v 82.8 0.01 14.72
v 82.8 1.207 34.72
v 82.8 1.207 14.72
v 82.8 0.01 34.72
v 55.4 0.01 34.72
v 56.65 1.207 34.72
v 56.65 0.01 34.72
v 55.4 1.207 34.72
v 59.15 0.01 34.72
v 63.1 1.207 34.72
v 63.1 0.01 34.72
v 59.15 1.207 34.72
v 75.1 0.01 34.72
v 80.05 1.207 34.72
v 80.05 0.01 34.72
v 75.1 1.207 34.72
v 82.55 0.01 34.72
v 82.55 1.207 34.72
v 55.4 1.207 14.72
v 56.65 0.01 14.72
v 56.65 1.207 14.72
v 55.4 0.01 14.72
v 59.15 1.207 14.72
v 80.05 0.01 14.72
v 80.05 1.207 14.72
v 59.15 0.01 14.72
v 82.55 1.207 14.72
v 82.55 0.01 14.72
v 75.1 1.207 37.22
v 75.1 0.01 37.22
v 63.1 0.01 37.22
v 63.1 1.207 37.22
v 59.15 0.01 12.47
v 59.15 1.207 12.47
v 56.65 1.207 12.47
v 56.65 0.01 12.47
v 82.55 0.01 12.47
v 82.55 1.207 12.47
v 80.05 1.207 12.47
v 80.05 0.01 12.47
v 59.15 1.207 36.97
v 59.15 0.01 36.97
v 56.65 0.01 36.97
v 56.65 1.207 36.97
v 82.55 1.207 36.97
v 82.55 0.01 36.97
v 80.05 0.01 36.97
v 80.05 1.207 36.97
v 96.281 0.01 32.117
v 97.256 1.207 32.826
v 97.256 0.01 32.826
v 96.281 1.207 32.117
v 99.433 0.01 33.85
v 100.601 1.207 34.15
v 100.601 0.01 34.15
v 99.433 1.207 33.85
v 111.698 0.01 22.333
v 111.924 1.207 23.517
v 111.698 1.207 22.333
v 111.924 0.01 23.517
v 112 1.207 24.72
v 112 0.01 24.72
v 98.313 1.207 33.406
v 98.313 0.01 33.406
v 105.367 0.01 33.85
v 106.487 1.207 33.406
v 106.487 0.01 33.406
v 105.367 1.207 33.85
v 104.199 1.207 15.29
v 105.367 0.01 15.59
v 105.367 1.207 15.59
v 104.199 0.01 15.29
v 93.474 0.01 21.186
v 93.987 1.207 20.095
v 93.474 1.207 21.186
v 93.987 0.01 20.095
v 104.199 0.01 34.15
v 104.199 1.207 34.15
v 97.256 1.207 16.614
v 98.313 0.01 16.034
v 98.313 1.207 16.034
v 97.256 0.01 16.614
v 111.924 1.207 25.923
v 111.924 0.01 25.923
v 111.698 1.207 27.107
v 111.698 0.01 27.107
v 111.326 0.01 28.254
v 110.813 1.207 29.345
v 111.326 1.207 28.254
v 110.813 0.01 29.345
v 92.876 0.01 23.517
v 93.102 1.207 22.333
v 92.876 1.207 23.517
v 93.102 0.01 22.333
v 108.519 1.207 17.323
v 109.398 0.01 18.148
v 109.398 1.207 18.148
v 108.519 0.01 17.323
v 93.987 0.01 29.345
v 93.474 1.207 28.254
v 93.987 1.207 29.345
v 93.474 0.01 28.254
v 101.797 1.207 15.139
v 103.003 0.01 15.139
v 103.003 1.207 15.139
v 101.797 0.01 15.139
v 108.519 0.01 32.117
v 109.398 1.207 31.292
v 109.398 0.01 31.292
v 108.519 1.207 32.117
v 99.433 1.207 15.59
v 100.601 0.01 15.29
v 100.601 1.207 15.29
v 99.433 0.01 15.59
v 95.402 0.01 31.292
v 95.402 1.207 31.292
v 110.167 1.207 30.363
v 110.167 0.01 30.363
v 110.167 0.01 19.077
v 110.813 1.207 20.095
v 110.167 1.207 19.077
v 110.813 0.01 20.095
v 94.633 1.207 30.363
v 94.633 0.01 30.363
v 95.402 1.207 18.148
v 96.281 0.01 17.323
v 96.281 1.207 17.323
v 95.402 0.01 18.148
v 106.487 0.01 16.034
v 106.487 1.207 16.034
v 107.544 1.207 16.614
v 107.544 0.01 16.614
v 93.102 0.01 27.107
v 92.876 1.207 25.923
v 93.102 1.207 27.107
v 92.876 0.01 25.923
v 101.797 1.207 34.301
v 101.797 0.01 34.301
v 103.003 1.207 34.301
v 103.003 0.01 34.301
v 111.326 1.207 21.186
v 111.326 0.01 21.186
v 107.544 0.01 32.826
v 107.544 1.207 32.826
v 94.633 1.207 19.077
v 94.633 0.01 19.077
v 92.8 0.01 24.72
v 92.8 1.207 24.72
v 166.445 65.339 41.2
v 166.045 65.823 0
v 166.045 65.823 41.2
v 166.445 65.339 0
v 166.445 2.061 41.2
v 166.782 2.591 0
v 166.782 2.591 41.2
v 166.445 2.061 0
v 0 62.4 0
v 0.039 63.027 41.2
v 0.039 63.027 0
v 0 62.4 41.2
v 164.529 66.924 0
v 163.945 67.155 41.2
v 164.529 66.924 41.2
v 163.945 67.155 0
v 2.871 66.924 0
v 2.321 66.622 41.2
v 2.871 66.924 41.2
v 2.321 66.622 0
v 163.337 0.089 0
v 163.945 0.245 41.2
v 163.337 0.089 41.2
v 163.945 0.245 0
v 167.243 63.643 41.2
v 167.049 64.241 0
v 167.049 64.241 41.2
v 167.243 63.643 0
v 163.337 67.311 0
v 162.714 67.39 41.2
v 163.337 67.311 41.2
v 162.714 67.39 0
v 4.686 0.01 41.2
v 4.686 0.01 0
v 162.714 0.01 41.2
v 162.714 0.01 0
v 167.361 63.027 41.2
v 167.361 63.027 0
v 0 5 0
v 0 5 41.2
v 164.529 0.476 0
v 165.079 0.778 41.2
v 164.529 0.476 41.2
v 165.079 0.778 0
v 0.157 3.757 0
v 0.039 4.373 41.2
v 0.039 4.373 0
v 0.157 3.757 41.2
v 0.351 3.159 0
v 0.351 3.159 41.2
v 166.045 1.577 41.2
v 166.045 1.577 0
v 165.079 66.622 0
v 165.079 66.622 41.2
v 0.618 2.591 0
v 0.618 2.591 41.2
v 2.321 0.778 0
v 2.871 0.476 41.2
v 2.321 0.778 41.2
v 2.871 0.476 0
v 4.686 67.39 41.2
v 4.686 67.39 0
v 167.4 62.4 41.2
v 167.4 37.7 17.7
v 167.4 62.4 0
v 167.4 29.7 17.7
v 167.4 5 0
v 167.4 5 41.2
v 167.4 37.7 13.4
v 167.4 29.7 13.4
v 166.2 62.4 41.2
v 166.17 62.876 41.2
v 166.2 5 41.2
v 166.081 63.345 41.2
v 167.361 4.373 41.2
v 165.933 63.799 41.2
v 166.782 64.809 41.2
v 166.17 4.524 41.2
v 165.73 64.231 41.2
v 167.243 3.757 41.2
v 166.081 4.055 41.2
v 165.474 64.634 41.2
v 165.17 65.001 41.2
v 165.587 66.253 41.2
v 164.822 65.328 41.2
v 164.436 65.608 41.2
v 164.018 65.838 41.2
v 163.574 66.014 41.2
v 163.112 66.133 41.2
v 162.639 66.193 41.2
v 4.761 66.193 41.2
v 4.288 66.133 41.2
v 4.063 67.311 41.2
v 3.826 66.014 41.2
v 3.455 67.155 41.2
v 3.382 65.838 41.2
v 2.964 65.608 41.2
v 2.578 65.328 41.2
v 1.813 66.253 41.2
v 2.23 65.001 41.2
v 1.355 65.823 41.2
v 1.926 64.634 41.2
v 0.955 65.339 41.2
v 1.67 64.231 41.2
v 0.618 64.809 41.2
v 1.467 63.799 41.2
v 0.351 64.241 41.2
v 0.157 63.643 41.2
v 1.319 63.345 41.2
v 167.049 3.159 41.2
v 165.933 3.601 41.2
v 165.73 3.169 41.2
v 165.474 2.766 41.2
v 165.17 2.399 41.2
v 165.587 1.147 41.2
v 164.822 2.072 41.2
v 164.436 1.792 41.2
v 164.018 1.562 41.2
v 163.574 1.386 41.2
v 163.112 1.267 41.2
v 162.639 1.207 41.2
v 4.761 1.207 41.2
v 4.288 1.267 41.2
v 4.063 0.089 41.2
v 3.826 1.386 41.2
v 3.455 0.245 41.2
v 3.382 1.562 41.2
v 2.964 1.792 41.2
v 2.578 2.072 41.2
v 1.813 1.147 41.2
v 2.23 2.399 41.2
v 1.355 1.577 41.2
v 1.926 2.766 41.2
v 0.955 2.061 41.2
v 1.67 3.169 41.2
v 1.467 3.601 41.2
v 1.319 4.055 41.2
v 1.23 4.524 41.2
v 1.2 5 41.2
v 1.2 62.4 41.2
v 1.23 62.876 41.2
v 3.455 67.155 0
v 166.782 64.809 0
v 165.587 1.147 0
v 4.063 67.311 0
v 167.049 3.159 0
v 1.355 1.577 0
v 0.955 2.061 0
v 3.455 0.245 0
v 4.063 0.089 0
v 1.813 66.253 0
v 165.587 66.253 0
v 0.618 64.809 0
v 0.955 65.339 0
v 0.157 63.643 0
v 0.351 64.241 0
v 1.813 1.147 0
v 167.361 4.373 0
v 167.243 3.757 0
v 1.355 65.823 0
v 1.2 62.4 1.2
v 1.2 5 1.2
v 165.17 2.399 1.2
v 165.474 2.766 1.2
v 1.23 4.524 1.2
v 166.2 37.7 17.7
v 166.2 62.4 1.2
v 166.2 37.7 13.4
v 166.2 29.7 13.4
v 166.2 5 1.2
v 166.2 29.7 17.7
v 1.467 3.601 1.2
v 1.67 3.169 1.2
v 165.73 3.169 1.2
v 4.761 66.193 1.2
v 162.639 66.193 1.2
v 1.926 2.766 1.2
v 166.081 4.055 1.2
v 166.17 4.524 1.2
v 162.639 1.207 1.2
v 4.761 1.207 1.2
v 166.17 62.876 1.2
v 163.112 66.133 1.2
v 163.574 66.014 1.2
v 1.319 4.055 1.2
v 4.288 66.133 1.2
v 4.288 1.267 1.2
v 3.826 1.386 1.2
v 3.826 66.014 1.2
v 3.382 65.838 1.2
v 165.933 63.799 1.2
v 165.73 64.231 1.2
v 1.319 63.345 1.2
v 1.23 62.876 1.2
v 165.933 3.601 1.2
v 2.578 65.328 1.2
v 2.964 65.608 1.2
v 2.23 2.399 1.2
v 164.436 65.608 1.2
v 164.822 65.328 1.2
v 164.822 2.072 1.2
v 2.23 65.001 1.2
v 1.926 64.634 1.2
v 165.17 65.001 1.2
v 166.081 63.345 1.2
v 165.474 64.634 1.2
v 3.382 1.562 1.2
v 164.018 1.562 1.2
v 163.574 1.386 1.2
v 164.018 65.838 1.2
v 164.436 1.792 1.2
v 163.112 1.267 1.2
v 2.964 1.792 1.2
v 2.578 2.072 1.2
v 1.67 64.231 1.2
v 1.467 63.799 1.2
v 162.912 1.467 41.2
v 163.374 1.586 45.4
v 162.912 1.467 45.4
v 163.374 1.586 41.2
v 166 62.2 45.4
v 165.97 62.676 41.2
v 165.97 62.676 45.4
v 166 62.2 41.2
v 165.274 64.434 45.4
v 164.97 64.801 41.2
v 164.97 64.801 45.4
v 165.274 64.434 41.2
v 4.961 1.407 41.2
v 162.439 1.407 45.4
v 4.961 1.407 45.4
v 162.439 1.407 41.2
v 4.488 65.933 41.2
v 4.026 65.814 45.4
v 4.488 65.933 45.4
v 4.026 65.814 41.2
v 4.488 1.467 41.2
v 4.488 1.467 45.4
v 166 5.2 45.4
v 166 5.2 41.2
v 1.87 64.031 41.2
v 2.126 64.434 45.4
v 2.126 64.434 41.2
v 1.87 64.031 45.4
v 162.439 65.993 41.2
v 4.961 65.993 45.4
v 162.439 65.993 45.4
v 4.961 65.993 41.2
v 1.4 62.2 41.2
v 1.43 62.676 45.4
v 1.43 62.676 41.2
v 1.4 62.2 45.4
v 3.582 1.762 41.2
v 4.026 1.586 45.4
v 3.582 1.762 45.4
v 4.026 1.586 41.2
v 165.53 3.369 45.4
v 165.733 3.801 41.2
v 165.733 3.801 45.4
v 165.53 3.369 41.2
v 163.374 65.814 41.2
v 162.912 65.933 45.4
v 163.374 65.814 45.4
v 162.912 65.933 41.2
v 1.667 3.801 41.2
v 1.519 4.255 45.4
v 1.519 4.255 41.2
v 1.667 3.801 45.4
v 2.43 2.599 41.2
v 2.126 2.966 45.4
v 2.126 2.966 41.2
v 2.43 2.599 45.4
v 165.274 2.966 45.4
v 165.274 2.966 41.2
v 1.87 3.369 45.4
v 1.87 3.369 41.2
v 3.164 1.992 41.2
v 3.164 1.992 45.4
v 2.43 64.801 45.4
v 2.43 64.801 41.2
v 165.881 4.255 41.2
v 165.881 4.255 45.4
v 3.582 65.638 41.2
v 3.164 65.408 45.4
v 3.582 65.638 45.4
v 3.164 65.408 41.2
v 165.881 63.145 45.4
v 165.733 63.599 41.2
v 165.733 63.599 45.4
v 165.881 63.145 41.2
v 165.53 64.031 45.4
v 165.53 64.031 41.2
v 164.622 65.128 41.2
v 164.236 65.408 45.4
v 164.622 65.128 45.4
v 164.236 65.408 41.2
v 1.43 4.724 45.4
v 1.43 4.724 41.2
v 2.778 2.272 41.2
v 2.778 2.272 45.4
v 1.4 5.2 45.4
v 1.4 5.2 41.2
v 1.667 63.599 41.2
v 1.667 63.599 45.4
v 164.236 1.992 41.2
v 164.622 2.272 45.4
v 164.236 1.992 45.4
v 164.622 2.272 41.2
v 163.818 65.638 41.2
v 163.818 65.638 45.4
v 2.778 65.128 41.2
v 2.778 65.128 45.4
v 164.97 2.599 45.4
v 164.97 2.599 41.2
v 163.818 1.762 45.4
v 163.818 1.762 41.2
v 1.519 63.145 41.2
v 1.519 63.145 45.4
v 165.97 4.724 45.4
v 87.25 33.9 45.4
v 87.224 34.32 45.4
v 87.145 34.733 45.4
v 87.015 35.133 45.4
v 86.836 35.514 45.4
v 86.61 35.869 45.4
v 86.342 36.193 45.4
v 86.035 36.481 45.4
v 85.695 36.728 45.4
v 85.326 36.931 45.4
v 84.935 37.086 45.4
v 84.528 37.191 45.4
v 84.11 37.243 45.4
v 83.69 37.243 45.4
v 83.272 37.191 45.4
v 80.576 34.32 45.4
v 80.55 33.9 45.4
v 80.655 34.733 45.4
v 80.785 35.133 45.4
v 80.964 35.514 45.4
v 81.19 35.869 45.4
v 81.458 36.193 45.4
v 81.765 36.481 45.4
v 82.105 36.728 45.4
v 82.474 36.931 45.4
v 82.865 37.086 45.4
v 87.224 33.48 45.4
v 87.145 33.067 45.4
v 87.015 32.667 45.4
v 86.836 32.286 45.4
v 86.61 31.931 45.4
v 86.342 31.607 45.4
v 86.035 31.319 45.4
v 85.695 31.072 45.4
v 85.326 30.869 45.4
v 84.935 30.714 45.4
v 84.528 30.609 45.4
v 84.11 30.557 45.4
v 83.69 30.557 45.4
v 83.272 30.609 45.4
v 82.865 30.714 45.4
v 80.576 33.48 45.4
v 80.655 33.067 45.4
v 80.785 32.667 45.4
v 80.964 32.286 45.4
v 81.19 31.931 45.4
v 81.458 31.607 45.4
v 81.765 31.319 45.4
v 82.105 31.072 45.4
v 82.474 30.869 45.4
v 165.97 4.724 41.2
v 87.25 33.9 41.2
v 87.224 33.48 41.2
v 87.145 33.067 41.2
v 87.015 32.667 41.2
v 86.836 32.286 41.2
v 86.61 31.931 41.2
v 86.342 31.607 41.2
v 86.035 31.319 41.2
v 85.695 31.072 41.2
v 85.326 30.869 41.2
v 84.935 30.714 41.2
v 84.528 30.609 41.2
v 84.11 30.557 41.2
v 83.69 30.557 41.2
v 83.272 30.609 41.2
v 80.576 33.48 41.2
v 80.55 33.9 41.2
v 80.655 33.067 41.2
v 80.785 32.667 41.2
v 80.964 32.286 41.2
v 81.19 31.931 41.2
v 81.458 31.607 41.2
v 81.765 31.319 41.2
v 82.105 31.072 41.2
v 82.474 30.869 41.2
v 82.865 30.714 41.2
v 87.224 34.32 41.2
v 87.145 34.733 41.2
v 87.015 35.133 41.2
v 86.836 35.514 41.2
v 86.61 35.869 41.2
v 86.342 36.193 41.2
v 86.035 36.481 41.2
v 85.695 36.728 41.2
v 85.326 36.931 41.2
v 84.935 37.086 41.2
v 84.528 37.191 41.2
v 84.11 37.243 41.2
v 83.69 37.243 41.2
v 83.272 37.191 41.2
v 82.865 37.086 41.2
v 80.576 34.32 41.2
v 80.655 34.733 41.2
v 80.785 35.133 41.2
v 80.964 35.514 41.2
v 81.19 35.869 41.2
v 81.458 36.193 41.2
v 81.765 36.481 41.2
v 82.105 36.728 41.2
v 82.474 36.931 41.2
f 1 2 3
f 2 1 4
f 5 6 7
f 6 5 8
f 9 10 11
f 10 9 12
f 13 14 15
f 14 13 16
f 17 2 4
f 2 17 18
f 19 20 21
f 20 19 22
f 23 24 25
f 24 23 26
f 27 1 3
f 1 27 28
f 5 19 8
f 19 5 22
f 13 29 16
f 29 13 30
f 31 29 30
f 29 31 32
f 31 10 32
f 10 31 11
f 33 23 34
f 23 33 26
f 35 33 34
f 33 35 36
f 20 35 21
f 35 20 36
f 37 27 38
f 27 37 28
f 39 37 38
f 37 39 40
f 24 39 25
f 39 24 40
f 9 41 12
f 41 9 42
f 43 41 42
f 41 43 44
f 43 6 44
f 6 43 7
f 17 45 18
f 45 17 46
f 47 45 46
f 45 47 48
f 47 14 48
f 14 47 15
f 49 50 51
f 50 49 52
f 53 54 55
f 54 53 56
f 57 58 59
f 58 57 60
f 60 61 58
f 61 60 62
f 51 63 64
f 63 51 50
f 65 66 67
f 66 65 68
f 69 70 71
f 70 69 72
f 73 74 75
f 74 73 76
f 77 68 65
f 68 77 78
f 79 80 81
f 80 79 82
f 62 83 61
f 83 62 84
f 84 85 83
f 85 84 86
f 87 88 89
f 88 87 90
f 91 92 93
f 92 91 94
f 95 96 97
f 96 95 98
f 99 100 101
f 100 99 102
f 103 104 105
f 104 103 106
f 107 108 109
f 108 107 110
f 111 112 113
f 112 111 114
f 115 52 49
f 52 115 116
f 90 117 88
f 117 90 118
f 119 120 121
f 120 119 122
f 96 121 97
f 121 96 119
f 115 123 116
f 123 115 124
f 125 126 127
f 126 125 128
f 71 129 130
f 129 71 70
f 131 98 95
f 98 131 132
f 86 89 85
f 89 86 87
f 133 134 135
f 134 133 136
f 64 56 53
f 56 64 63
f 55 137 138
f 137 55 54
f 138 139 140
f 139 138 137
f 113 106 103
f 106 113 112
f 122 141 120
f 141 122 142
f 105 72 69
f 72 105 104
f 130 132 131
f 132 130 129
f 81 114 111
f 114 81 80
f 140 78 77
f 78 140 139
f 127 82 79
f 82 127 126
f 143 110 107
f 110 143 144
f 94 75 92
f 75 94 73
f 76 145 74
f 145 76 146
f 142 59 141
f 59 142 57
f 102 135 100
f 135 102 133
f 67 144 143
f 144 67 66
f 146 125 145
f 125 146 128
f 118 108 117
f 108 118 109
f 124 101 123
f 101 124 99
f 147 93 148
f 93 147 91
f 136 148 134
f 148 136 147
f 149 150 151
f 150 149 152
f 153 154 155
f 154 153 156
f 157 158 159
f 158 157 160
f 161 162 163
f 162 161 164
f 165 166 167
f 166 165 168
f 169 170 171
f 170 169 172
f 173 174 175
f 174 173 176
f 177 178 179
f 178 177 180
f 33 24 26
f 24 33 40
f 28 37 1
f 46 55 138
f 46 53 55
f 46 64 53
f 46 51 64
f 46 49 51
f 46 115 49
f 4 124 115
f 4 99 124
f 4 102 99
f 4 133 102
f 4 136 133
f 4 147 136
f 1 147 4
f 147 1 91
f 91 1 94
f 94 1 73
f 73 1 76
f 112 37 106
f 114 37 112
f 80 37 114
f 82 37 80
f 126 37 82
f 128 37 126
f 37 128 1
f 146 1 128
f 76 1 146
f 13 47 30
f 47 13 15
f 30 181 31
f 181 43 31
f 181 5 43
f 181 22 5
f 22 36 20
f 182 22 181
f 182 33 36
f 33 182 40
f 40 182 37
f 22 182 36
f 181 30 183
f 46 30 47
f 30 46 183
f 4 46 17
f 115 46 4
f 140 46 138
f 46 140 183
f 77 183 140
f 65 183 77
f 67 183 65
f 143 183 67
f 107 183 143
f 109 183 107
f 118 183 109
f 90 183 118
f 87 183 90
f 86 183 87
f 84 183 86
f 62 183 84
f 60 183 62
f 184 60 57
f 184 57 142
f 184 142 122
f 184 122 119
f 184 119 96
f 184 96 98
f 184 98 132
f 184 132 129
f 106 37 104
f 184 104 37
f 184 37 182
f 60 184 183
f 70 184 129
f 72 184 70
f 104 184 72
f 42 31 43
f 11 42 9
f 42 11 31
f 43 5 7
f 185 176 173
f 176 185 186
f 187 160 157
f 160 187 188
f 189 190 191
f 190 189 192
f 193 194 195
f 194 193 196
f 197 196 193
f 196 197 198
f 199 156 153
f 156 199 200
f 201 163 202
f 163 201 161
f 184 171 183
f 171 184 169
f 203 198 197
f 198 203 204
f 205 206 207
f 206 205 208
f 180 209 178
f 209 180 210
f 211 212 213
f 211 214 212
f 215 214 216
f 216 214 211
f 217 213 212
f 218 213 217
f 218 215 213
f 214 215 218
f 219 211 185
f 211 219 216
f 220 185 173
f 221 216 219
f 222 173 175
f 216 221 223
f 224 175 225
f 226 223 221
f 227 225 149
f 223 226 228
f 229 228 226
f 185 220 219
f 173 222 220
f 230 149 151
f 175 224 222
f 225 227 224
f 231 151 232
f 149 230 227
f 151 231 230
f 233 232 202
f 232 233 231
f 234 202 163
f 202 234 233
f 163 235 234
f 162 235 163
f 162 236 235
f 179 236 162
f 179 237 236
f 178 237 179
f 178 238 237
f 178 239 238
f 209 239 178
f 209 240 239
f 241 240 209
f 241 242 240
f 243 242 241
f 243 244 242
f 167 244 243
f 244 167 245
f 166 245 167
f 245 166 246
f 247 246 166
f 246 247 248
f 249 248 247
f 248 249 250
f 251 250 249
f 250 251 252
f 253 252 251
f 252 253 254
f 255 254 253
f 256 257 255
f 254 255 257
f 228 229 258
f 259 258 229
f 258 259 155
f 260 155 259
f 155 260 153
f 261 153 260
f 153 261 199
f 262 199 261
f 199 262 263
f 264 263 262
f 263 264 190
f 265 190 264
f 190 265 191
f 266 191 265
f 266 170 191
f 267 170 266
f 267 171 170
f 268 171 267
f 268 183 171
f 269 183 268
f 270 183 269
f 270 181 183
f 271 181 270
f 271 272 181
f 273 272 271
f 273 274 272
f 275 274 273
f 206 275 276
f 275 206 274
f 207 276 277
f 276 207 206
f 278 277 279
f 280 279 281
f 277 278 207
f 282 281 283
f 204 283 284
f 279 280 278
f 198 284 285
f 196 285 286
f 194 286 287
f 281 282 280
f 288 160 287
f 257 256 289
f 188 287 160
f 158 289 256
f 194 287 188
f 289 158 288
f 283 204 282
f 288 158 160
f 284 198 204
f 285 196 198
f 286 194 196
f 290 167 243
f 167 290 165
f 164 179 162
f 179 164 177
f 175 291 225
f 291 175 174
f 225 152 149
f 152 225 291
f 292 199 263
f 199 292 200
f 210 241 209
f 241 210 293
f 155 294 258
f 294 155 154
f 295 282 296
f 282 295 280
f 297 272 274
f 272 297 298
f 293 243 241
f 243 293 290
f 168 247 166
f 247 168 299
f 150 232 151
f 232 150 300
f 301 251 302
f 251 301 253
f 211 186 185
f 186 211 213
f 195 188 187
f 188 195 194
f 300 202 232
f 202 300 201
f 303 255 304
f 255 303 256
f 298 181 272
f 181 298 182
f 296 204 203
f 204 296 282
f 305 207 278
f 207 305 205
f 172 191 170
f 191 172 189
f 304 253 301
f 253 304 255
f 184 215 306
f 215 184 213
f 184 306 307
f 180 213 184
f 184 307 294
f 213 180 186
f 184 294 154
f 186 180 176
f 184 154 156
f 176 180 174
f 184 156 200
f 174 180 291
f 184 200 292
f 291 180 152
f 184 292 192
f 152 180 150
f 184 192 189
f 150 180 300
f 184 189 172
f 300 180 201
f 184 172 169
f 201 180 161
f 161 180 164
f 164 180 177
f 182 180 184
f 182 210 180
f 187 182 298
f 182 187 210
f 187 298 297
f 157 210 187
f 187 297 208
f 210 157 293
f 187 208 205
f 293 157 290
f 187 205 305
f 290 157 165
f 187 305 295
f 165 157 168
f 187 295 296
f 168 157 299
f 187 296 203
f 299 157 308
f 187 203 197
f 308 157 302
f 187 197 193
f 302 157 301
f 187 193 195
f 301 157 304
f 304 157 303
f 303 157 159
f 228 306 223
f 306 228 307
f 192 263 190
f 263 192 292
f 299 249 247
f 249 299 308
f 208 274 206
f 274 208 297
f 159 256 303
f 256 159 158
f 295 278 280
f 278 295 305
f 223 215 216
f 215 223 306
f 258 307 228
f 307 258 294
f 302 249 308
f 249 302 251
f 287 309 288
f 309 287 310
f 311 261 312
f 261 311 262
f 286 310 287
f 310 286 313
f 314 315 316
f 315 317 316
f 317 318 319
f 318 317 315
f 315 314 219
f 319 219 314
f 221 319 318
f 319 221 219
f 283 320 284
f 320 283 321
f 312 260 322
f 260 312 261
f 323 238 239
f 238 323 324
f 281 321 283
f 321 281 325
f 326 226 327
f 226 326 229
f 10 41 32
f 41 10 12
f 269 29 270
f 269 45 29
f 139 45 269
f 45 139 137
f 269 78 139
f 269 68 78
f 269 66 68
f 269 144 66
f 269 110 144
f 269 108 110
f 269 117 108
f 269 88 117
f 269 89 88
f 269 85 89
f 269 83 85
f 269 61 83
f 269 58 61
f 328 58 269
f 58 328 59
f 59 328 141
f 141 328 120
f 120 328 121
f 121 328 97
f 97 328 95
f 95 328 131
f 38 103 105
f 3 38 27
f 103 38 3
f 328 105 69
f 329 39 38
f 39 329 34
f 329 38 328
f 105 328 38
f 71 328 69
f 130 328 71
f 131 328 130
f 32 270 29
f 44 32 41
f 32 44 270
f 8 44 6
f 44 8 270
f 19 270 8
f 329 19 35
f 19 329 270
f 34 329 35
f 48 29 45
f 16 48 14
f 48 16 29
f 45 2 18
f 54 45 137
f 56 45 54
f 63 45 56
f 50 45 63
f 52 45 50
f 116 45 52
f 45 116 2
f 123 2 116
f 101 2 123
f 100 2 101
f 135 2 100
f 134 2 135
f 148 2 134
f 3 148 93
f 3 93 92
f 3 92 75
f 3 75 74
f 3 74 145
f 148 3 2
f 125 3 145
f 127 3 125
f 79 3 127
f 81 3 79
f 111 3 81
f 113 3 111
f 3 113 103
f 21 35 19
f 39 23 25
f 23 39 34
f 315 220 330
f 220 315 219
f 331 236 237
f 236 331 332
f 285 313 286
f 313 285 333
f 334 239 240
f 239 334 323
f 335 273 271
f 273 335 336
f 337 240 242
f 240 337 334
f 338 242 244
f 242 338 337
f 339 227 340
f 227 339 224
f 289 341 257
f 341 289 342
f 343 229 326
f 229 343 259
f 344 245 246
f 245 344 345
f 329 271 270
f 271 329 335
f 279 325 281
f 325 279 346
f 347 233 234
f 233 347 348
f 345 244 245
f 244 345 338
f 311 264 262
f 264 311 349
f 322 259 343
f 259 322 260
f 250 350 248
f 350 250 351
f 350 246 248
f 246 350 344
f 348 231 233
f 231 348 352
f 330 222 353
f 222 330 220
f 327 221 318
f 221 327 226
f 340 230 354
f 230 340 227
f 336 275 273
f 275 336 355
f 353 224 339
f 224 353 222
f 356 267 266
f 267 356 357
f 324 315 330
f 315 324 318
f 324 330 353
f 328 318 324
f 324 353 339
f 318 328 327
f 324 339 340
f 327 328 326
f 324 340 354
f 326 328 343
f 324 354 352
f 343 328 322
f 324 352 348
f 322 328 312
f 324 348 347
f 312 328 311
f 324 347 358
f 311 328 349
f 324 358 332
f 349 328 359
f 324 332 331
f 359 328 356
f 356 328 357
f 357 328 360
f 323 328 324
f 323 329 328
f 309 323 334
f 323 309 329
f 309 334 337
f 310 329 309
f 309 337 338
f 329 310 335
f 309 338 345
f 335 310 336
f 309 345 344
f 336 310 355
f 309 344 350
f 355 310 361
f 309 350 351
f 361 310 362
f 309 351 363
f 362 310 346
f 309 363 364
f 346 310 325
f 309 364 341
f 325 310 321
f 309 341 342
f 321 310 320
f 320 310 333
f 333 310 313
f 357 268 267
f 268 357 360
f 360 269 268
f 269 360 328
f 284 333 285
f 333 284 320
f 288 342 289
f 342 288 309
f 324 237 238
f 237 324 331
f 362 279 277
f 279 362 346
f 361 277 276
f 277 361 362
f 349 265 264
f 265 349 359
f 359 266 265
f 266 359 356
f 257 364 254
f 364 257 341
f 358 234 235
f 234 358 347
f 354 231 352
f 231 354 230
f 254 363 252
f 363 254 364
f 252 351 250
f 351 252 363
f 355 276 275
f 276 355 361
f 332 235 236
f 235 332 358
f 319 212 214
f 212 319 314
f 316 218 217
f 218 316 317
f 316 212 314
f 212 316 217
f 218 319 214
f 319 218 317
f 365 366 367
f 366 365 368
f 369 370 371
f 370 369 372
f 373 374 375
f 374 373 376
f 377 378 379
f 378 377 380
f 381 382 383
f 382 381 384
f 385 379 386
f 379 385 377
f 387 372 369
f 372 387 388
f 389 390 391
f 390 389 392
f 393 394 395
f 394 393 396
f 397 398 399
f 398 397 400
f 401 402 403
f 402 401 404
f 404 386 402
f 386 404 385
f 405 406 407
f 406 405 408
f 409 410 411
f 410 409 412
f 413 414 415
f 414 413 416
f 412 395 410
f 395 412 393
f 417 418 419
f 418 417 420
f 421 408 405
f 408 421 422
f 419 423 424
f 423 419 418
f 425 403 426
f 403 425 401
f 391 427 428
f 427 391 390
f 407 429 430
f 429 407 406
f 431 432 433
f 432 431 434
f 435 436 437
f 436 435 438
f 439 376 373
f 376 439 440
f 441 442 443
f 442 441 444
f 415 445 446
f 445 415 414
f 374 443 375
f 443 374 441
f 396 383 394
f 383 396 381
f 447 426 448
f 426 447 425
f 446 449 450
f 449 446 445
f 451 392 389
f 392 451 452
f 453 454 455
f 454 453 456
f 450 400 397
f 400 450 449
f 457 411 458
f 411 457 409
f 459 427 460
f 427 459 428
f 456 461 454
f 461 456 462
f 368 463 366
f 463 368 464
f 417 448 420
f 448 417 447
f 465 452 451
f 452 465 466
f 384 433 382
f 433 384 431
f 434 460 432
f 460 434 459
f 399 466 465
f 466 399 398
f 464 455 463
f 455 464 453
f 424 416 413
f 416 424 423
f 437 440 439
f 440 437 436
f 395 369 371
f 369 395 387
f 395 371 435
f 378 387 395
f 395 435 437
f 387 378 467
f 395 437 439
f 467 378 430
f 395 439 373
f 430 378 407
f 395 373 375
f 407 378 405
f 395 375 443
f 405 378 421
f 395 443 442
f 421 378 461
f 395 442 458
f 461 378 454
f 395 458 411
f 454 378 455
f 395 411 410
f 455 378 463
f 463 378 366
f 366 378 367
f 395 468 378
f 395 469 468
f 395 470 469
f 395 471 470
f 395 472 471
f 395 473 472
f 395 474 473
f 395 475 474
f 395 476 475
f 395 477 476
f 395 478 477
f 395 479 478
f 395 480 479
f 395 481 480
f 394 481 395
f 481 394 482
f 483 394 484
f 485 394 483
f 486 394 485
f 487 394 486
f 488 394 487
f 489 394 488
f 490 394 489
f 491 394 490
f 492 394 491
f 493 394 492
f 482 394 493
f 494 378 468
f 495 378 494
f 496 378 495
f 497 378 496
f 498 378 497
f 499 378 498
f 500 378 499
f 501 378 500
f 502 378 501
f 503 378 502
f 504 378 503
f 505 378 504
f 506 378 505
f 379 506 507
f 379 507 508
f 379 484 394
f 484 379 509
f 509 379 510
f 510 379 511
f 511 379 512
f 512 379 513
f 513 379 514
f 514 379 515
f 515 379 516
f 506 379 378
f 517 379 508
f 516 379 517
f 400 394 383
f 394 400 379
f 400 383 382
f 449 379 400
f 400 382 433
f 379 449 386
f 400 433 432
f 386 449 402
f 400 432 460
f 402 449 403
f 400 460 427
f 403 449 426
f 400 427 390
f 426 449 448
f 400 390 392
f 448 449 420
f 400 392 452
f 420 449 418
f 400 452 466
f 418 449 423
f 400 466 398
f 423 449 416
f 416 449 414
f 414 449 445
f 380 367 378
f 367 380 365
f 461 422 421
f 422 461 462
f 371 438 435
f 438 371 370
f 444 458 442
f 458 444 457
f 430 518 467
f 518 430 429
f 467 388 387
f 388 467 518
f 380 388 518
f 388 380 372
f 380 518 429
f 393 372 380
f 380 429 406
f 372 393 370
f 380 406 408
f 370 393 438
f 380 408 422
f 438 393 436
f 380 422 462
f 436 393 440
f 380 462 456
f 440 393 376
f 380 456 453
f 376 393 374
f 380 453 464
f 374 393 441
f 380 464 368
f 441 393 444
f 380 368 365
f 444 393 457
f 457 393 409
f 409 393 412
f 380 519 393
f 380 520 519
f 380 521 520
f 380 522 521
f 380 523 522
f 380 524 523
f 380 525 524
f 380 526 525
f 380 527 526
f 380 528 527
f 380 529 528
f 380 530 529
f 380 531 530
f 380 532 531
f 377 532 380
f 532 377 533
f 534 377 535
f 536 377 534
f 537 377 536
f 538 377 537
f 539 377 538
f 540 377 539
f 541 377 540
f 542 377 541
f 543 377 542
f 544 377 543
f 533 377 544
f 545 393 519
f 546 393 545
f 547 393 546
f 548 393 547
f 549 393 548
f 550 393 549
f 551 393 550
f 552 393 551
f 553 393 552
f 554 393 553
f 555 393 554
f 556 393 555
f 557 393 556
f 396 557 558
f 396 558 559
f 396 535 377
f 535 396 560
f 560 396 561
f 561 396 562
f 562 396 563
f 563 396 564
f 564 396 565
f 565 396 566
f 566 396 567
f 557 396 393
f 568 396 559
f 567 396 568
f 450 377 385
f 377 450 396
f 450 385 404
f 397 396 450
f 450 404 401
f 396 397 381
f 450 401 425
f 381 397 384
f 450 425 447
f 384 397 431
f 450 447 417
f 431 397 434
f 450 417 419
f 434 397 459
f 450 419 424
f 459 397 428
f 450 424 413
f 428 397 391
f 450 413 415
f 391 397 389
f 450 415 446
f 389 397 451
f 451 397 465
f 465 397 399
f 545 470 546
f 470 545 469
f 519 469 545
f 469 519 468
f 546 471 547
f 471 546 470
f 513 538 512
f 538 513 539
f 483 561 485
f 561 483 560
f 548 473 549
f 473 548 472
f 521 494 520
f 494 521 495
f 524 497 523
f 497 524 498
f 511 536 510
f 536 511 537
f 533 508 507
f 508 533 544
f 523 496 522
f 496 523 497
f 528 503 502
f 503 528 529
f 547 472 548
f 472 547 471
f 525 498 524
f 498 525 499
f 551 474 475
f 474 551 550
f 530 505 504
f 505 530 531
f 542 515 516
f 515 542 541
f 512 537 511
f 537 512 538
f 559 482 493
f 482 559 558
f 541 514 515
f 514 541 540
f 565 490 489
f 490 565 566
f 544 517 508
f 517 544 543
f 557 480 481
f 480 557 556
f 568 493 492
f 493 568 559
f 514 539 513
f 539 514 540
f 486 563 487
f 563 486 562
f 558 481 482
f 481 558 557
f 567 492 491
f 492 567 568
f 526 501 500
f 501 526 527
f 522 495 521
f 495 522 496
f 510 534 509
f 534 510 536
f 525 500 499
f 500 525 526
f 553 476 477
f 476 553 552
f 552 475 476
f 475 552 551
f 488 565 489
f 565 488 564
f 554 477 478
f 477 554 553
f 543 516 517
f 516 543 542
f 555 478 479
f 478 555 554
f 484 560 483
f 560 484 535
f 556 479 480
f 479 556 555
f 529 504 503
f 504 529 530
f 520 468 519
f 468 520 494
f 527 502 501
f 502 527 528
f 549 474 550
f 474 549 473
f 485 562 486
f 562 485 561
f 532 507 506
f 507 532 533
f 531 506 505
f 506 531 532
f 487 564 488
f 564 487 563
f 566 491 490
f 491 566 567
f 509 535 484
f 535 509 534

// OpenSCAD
// Vibrating Alarm Clock Chassis
// Designed for Raspberry Pi on breadboard with OLED display

// Global parameters
$fn = 50; // Resolution for curved surfaces

// Wall thickness
wall_thickness = 1.2;

// Internal dimensions
internal_width = 165;   // Breadboard width + minimal clearance
internal_depth = 65;    // Breadboard depth + Pi + minimal clearance  
internal_height = 40;   // Height for breadboard + Pi + connections

// Button hole diameter (threaded)
button_diameter = 6.7;
button_thread_depth = 3; // Reduced thickness for threading

// OLED display dimensions
oled_width = 27.4;
oled_height = 20;
oled_mounting_hole_diameter = 2.5; // Standard M2.5 screws
oled_mounting_spacing_x = 25;      // Approximate spacing between holes
oled_mounting_spacing_y = 15;      // Approximate spacing between holes

// USB port dimensions (micro USB) - increased height clearance
usb_width = 8;
usb_height = 4.3; // Increased by 1mm for clearance

// External dimensions
external_width = internal_width + 2 * wall_thickness;
external_depth = internal_depth + 2 * wall_thickness;
external_height = internal_height + wall_thickness; // Bottom wall

// Top lid thickness (increased for button threading)
top_thickness = wall_thickness + button_thread_depth;

// Wire grommet diameter (increased to 19.2mm)
grommet_diameter = 19.2;

// Corner radius for rounded edges
corner_radius = 5;

// Fitting clearance for 3D printing
fit_clearance = 0.2; // Clearance between lid and main body for good fit

// Lid insert depth (how far the lid goes into the box)
lid_insert_depth = 4; // Small insertion depth for secure fit

// Brim dimensions for lid
brim_width = 2; // Width of the brim around the lid
brim_thickness = 0.8; // Thickness of the brim

// Lip dimensions for removable top (increased clearances for better fit)
lip_height = 1;
lip_thickness = 1.2; // Increased from 0.8 for looser fit

// Main assembly - choose what to render
render_main_body = false;
render_top = false;
render_assembled = true; // Set to true to see assembled view

if (render_assembled) {
    // Assembled view
    main_body();
    translate([wall_thickness + fit_clearance, wall_thickness + fit_clearance, external_height]) top_lid();

} else {
    // Separate parts for printing
    if (render_main_body) {
        main_body();
    }
    
    if (render_top) {
        translate([0, external_depth * 2 + 15, top_thickness]) 
        rotate([180, 0, 0])
        top_lid();
    }
} 
module main_body() {
    difference() {
        // Main body exterior
        rounded_box(external_width, external_depth, external_height, corner_radius);
        
        // Internal cavity
        translate([wall_thickness, wall_thickness, wall_thickness])
        rounded_box(internal_width, internal_depth, internal_height + 1, corner_radius - wall_thickness);
        
        // Front panel cutouts
        front_panel_cutouts();
        
        // Side panel cutout for Raspberry Pi USB port
        side_panel_cutouts();
    }
}

module top_lid() {
    difference() {
        // Lid that fits inside the box with clearance
        rounded_box(internal_width - 2 * fit_clearance, internal_depth - 2 * fit_clearance, top_thickness, corner_radius - wall_thickness);
        
        // Button hole (threaded)
        translate([internal_width/2, internal_depth/2, -1])
        cylinder(h = top_thickness + 2, d = button_diameter);
    }
}

module front_panel_cutouts() {
    // Calculate positions for side-by-side centered layout
    total_width = oled_width + grommet_diameter + 10; // 10mm spacing between them
    start_x = (external_width - total_width) / 2;
    center_height = external_height * 0.6;
    
    // OLED display cutout (left side of center)
    oled_center_x = start_x + oled_width/2;
    oled_center_z = center_height;
    
    translate([start_x, -1, center_height - oled_height/2])
    cube([oled_width, wall_thickness + 2, oled_height]);
    
    // OLED pin cutout (separate rectangular cutout at same height as top screw holes)
    pin_cutout_width = 12; // Wide enough for 4 pins with spacing
    pin_cutout_height = 3; // Height to clear soldered pins
    pin_cutout_x = start_x + (oled_width - pin_cutout_width) / 2; // Center on OLED
    pin_cutout_z = oled_center_z + oled_height/2 + 1 - pin_cutout_height/2; // Same Z as top screw holes
    
    translate([pin_cutout_x, -1, pin_cutout_z])
    cube([pin_cutout_width, wall_thickness + 2, pin_cutout_height]);
    
    // OLED mounting holes (M2.5 screws) - positioned inside OLED area
    // Inset from edges by 2mm, bottom holes below display cutout
    hole_inset = 1.5;
    bottom_hole_offset = 3; // Distance below display cutout
    hole_depth = wall_thickness + 10; // Extend into internal cavity
    
    // Bottom left
    translate([start_x + hole_inset - oled_mounting_hole_diameter/2 + 1, -1, 2 + oled_center_z - oled_height/2 - bottom_hole_offset - oled_mounting_hole_diameter/2])
    cube([oled_mounting_hole_diameter, hole_depth, oled_mounting_hole_diameter]);
    
    // Bottom right
    translate([start_x + oled_width - hole_inset - oled_mounting_hole_diameter/2, -1, 2+ oled_center_z - oled_height/2 - bottom_hole_offset - oled_mounting_hole_diameter/2])
    cube([oled_mounting_hole_diameter, hole_depth, oled_mounting_hole_diameter]);
    
    // Top left
    translate([start_x + hole_inset - oled_mounting_hole_diameter/2 + 1, -1, oled_center_z + oled_height/2 + 1 - oled_mounting_hole_diameter/2])
    cube([oled_mounting_hole_diameter, hole_depth, oled_mounting_hole_diameter]);
    
    // Top right
    translate([start_x + oled_width - hole_inset - oled_mounting_hole_diameter/2, -1, oled_center_z + oled_height/2 + 1- oled_mounting_hole_diameter/2])
    cube([oled_mounting_hole_diameter, hole_depth, oled_mounting_hole_diameter]);
    
    // Wire grommet hole (right side of center)
    translate([start_x + oled_width + 10 + grommet_diameter/2, -1, center_height])
    rotate([-90, 0, 0])
    cylinder(h = wall_thickness + 2, d = grommet_diameter);
}

module side_panel_cutouts() {
    // Raspberry Pi micro USB port cutout on the right side
    // From breadboard bottom: bottom of port at 12.2mm, top at 15.5mm
    translate([external_width - wall_thickness - 1, external_depth/2 - usb_width/2, wall_thickness + 12.2])
    cube([wall_thickness + 2, usb_width, usb_height]);
}

module rounded_box(width, depth, height, radius) {
    hull() {
        // Bottom corners
        translate([radius, radius, 0])
        cylinder(h = height, r = radius);
        
        translate([width - radius, radius, 0])
        cylinder(h = height, r = radius);
        
        translate([radius, depth - radius, 0])
        cylinder(h = height, r = radius);
        
        translate([width - radius, depth - radius, 0])
        cylinder(h = height, r = radius);
    }
}

// Print instructions as comments:
/*
PRINTING INSTRUCTIONS:
1. Print main_body upright (as oriented in separate parts view)
2. Print top_lid upside down (as oriented in separate parts view) - the brim will be on the print bed
3. Use 0.2mm layer height
4. 20-30% infill is sufficient
5. Support material needed for wire grommet hole overhang
6. No supports needed for other features
7. The brim around the lid helps with bed adhesion and provides a snug fit

ASSEMBLY:
1. Place breadboard on bottom inside main body
2. Place Raspberry Pi on breadboard
3. Install OLED display in front cutout
4. Thread motor wire through grommet hole and install grommet
5. Install button through top lid
6. Place top lid on main body - inner part fits inside cavity with 0.2mm clearance

DIMENSIONS:
- External: 176mm x 76mm x 48mm
- Internal cavity: 170mm x 70mm x 45mm
- Wall thickness: 3mm
- Lid has brim for better fit and printing
*/
